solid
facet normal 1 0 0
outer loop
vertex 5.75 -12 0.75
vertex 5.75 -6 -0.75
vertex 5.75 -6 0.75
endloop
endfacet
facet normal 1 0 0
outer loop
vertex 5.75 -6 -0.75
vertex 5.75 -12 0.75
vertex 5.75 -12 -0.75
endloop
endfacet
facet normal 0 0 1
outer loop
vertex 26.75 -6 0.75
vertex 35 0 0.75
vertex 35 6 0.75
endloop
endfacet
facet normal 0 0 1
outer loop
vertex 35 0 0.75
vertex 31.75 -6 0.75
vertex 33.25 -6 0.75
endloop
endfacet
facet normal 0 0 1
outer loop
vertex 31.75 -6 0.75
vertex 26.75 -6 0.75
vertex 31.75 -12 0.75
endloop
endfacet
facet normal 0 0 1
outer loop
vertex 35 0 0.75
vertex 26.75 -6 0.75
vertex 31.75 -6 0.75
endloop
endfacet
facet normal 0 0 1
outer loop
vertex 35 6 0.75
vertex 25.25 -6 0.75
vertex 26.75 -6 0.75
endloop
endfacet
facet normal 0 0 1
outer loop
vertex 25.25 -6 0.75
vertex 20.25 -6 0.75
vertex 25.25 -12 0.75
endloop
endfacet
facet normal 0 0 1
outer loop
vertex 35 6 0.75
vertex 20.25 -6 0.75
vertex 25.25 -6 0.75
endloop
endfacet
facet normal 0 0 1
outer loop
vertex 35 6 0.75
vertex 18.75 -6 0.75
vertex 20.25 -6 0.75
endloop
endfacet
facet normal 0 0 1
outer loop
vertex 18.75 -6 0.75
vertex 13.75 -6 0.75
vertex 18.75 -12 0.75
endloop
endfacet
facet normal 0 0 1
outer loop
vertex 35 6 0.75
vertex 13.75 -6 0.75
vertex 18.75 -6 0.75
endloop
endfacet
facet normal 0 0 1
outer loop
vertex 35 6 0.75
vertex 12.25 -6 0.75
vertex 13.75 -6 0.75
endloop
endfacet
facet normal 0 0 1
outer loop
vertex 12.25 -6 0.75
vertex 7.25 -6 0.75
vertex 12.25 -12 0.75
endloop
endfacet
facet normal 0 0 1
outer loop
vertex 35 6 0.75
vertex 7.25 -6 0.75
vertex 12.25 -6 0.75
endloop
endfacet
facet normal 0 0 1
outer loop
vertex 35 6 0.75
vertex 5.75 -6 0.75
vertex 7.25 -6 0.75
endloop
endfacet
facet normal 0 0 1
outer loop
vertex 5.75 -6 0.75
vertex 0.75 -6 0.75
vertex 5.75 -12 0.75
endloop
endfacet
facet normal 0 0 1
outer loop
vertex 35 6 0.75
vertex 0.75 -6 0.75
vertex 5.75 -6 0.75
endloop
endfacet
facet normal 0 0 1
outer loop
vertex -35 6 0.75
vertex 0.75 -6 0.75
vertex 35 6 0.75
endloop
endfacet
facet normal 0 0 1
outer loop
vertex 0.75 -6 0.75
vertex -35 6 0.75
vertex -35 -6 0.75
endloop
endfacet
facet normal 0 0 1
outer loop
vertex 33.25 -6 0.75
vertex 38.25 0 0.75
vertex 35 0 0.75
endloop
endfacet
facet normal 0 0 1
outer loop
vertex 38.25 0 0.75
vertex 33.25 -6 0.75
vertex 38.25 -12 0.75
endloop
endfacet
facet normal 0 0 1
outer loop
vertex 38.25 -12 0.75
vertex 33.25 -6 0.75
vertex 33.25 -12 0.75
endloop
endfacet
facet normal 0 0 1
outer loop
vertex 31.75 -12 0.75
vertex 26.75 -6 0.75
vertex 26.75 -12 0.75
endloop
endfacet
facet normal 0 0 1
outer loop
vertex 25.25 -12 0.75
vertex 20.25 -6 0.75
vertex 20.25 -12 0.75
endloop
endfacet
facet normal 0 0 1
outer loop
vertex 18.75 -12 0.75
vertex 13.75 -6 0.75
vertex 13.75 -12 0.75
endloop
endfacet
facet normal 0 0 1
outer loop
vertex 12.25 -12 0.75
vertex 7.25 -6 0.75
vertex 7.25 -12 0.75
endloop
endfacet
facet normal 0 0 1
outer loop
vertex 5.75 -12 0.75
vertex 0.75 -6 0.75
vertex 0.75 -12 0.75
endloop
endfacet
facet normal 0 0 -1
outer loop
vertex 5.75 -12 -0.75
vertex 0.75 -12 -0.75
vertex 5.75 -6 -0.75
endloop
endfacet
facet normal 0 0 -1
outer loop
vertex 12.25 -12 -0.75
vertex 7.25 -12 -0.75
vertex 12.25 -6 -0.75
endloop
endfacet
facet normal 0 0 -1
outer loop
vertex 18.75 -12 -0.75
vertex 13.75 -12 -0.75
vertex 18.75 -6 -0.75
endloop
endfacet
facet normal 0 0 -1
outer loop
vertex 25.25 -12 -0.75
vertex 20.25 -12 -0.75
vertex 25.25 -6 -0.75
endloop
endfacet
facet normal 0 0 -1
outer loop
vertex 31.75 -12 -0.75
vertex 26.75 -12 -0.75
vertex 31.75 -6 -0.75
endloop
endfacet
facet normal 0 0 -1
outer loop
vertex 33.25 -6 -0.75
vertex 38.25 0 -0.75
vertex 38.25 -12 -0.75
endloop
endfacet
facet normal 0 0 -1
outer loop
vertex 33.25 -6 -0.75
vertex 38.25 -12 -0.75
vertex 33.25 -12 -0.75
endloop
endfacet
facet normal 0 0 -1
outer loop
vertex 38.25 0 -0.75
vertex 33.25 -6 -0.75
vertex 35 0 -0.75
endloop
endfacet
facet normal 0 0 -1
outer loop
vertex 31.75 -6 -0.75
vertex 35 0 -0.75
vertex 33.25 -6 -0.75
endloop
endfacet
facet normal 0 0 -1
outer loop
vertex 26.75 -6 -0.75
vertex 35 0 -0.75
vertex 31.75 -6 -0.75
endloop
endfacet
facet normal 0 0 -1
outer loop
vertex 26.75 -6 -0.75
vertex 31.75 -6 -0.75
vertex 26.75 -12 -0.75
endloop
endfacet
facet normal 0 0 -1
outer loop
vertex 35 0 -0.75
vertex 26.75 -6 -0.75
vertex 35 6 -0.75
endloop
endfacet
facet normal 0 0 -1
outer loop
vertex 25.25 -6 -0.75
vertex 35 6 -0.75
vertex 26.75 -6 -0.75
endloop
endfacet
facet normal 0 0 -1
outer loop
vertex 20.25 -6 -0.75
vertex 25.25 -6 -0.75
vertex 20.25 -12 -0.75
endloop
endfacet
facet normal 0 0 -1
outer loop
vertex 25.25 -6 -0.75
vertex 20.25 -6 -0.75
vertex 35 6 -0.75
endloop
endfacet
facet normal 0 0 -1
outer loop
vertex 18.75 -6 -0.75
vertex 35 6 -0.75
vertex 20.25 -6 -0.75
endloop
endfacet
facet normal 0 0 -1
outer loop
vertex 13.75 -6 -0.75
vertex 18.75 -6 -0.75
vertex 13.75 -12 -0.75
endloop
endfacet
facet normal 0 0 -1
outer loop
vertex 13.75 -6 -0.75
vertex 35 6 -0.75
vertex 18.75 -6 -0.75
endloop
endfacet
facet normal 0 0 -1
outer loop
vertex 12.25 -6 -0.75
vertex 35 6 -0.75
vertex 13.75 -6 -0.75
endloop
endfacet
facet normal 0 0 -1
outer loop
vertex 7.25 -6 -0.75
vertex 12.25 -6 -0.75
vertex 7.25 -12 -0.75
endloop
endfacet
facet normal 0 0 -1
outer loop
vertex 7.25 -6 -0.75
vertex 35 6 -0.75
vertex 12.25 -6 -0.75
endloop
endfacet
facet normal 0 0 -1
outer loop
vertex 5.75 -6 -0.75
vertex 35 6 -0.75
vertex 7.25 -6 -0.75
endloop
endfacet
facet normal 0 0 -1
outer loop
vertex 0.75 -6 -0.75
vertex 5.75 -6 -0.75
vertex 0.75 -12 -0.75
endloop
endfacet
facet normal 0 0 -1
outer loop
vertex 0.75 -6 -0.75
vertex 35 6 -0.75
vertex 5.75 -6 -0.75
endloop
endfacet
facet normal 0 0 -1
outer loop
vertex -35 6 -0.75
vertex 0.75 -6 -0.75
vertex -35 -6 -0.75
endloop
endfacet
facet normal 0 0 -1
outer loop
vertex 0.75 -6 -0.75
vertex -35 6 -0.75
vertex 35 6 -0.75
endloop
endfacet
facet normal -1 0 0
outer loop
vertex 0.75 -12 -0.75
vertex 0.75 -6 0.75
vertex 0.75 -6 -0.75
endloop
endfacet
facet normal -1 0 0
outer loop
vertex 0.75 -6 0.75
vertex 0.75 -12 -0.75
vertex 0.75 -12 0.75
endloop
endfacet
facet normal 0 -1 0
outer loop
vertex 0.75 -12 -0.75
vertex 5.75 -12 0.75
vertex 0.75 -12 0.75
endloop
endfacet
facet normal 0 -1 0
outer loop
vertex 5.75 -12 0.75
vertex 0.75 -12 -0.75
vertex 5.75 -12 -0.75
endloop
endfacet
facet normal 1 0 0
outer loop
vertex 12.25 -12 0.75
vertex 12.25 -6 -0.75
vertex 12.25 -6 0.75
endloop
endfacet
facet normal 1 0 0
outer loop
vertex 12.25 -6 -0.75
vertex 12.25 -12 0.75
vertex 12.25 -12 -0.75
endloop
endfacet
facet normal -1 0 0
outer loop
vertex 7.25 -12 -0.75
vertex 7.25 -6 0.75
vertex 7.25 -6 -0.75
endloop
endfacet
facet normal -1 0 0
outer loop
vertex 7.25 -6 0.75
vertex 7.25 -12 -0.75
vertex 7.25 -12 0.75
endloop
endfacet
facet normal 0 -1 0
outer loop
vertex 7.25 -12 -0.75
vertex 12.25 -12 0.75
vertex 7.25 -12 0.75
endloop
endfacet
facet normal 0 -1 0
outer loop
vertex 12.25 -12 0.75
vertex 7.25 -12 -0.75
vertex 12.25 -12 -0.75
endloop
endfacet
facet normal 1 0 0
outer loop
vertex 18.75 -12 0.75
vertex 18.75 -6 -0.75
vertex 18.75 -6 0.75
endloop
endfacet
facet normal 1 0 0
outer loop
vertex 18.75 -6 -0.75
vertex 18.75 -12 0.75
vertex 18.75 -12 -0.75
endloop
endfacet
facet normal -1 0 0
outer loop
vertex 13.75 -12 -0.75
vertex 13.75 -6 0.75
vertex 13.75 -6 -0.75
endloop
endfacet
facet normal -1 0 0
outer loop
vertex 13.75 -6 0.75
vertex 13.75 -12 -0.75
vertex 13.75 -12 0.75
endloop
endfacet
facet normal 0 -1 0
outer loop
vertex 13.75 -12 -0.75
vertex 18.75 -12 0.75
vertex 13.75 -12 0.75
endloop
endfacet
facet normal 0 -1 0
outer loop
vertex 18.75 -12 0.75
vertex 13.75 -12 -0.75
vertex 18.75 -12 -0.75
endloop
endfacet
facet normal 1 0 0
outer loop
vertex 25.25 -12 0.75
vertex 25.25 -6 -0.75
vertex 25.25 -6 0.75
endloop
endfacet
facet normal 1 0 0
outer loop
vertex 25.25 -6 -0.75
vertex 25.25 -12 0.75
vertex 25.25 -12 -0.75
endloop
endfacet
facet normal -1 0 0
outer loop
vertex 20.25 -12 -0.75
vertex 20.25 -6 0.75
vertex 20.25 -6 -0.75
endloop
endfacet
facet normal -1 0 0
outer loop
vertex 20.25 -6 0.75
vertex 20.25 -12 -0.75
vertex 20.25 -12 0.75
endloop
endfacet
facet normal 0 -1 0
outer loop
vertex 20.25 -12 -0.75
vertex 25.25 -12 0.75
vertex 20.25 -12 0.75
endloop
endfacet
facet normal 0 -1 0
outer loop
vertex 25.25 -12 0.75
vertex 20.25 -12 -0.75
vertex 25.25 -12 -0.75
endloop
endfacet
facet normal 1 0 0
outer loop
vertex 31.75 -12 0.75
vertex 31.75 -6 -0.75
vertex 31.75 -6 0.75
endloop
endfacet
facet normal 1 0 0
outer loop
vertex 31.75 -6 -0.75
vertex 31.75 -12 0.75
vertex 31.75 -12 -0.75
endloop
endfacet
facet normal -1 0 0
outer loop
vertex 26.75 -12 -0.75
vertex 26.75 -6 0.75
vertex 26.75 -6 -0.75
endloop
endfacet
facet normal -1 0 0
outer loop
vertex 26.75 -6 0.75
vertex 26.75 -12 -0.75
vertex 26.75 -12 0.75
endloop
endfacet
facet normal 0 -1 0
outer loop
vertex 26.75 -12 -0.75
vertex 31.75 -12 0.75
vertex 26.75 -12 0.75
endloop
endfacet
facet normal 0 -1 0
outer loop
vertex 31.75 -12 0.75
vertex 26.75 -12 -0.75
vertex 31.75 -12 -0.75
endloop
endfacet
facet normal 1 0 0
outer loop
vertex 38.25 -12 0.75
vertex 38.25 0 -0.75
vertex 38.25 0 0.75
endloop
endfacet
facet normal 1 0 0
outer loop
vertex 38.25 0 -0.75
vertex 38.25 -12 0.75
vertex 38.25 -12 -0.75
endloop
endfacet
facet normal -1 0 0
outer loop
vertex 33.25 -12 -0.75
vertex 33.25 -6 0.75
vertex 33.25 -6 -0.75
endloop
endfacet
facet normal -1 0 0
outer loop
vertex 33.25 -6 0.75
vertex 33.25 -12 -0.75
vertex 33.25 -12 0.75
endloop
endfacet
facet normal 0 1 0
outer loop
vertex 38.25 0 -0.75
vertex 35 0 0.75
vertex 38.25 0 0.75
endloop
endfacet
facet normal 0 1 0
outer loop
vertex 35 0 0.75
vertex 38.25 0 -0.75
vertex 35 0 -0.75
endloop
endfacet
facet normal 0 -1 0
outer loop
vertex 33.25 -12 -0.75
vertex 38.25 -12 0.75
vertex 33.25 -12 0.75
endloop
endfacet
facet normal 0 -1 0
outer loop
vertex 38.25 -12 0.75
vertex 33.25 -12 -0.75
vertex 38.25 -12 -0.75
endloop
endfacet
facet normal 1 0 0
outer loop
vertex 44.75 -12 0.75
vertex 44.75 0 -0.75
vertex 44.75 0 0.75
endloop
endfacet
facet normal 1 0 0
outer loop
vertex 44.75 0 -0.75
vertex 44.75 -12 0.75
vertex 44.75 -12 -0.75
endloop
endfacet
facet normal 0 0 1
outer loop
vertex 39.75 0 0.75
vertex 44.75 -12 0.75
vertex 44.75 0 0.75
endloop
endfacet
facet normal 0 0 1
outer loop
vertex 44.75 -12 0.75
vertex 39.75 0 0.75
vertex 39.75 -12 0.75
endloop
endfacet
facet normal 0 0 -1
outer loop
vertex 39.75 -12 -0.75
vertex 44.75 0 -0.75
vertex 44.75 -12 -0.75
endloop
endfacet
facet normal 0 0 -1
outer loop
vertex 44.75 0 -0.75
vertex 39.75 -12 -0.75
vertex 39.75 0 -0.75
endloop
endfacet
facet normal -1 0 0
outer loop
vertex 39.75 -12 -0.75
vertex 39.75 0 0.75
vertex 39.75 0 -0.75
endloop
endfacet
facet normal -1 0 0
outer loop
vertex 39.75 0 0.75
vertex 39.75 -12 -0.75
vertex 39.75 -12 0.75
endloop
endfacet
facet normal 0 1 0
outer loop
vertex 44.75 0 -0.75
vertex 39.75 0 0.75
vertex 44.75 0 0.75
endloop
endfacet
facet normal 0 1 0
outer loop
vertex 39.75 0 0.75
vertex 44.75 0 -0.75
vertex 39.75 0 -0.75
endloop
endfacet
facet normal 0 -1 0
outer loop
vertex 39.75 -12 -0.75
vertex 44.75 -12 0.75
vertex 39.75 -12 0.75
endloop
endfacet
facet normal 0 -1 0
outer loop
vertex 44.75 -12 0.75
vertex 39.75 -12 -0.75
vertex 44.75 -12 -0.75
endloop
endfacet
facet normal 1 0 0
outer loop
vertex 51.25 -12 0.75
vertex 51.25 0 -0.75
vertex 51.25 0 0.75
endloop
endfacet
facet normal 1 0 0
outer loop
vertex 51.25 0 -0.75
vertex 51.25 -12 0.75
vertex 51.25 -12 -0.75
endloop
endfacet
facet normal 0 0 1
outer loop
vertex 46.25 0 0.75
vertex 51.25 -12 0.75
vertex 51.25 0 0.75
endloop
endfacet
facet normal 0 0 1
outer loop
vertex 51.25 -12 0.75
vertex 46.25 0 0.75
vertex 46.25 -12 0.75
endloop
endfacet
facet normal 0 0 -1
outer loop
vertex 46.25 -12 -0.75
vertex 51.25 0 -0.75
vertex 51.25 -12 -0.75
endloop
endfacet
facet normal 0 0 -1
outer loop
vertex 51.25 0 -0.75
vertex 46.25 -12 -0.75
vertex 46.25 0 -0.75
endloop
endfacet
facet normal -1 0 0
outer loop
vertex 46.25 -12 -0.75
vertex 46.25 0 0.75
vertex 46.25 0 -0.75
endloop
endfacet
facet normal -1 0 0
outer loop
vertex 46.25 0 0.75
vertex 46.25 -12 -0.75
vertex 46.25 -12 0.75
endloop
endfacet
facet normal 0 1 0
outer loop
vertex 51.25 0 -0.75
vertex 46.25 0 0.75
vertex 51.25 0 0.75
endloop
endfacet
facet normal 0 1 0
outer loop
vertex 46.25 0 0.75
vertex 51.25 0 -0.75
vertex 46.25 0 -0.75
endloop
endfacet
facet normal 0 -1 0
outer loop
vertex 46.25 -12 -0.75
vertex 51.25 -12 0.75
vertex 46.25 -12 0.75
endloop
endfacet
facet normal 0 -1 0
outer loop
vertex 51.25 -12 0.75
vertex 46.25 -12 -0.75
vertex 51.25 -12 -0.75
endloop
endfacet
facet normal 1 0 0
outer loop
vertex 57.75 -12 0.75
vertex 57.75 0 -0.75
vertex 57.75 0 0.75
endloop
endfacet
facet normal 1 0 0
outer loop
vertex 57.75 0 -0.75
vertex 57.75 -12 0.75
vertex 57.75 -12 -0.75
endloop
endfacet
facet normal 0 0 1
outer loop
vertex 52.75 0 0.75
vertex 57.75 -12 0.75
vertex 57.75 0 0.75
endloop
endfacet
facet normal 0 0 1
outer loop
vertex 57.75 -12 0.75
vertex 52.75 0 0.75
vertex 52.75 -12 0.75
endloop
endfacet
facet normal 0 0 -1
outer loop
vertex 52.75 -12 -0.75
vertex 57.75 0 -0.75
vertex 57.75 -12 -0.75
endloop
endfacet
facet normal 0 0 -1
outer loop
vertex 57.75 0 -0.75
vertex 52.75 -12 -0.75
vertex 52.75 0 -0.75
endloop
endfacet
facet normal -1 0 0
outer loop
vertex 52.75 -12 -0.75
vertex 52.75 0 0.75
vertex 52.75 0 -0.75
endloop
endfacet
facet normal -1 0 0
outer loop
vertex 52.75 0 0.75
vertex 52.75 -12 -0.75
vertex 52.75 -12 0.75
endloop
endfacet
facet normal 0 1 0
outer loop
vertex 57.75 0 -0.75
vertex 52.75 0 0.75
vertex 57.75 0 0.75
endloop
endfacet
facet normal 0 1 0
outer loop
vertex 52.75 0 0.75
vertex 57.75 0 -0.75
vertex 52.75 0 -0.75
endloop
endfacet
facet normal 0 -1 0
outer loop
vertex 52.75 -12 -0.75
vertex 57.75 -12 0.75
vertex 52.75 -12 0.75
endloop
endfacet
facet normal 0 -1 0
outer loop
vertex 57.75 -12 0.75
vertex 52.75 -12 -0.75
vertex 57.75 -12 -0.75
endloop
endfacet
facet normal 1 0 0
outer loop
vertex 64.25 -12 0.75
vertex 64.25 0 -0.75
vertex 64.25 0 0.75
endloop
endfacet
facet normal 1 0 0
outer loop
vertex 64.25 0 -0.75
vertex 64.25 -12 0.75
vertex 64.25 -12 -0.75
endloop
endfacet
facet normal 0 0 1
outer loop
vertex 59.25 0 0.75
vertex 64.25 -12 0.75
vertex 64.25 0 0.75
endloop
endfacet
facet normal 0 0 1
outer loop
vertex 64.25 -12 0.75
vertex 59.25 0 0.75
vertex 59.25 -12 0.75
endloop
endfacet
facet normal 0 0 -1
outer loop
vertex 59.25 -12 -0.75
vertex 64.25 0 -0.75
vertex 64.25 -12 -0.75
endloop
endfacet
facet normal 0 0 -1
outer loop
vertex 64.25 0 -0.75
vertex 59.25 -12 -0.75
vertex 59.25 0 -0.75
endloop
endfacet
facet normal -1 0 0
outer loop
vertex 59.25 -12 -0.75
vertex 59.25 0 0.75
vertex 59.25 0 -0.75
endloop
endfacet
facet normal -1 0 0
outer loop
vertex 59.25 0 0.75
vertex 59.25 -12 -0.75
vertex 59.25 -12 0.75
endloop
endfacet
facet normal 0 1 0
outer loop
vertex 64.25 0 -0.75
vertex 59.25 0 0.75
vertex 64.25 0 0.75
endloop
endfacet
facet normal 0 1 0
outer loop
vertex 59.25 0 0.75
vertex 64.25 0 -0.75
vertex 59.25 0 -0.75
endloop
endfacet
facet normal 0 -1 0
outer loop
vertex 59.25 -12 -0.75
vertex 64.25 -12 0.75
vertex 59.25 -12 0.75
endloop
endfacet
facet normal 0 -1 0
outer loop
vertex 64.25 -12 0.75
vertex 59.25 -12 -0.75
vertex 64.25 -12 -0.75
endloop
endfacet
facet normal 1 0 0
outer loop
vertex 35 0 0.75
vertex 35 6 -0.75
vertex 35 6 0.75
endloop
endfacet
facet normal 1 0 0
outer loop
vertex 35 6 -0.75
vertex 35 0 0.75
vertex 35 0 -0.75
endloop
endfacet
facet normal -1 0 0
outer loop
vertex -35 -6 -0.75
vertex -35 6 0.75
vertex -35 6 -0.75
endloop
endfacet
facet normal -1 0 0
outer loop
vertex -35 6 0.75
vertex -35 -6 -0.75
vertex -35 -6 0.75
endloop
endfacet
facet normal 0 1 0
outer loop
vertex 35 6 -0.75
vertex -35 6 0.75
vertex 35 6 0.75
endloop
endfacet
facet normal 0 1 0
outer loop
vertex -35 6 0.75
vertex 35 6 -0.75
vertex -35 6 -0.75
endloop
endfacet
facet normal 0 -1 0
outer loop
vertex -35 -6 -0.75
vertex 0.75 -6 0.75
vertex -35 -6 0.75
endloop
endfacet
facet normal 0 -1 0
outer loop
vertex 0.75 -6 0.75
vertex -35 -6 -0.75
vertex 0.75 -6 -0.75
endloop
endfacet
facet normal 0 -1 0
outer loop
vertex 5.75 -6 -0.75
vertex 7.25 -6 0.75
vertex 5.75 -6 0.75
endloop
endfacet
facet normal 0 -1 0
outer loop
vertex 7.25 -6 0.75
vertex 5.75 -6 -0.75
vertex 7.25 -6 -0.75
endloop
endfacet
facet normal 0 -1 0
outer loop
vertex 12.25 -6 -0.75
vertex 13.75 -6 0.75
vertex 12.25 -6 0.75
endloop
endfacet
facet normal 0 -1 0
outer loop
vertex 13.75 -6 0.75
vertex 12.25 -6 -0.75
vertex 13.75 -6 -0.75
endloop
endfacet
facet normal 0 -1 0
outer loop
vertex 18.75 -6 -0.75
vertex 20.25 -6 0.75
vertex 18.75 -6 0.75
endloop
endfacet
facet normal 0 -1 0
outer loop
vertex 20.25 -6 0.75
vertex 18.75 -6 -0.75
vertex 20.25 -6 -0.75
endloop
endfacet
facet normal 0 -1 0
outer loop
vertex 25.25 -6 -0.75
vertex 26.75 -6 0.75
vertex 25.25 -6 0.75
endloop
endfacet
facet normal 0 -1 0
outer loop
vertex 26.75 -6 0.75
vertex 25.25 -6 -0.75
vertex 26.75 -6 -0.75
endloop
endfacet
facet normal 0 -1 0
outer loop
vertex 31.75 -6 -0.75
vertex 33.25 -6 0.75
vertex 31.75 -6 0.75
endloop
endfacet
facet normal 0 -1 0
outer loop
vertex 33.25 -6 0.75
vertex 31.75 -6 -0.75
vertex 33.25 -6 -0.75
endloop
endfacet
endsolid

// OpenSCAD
// Dimensions for the 10-well agarose gel comb
// All measurements in millimetres

// Overall dimensions
comb_length = 70;    // Length of the spine (X)
comb_width = 12;     // Width of the spine (Y)
comb_thickness = 1.5;// Thickness of the plate (Z)

// Tooth dimensions
tooth_length = 12;   // Length of the tooth (Y)
tooth_width = 5.0;   // Width of the tooth (X)

// Spacing and positioning
tooth_gap = 1.5;     // Gap between teeth (Y)
num_teeth = 10;      // Number of teeth

// Calculate total width of the teeth and gaps
total_teeth_width = (tooth_width * num_teeth) + (tooth_gap * (num_teeth - 1));

// Calculate offset to center the teeth row on the spine
// Spine Center X = (Spine Length - Total Width) / 2
spine_center_offset = (comb_length - total_teeth_width) / 2;

$fn = 64; // High resolution for curved surfaces

// Main body of the comb (Spine)
module spine() {
    // The spine is a rectangular block centered on the origin
    // We subtract the teeth area later to create the holes
    cube([comb_length, comb_width, comb_thickness], center=true);
}

// Individual Tooth
module tooth() {
    // Teeth are centered on the spine in X
    // They extend in the -Y direction
    translate([0, -tooth_length/2, 0])
    cube([tooth_width, tooth_length, comb_thickness], center=true);
}

// Build the comb
module gel_comb() {
    union() {
        spine();
        
        // Generate teeth grid
        for (i = [0 : num_teeth - 1]) {
            // Calculate X position based on spine centering
            // Spacing logic: Center + (i * (tooth_width + gap))
            translate([spine_center_offset + (i * (tooth_width + tooth_gap)), 0, 0]) {
                tooth();
            }
        }
    }
}

// Render the part
gel_comb();
